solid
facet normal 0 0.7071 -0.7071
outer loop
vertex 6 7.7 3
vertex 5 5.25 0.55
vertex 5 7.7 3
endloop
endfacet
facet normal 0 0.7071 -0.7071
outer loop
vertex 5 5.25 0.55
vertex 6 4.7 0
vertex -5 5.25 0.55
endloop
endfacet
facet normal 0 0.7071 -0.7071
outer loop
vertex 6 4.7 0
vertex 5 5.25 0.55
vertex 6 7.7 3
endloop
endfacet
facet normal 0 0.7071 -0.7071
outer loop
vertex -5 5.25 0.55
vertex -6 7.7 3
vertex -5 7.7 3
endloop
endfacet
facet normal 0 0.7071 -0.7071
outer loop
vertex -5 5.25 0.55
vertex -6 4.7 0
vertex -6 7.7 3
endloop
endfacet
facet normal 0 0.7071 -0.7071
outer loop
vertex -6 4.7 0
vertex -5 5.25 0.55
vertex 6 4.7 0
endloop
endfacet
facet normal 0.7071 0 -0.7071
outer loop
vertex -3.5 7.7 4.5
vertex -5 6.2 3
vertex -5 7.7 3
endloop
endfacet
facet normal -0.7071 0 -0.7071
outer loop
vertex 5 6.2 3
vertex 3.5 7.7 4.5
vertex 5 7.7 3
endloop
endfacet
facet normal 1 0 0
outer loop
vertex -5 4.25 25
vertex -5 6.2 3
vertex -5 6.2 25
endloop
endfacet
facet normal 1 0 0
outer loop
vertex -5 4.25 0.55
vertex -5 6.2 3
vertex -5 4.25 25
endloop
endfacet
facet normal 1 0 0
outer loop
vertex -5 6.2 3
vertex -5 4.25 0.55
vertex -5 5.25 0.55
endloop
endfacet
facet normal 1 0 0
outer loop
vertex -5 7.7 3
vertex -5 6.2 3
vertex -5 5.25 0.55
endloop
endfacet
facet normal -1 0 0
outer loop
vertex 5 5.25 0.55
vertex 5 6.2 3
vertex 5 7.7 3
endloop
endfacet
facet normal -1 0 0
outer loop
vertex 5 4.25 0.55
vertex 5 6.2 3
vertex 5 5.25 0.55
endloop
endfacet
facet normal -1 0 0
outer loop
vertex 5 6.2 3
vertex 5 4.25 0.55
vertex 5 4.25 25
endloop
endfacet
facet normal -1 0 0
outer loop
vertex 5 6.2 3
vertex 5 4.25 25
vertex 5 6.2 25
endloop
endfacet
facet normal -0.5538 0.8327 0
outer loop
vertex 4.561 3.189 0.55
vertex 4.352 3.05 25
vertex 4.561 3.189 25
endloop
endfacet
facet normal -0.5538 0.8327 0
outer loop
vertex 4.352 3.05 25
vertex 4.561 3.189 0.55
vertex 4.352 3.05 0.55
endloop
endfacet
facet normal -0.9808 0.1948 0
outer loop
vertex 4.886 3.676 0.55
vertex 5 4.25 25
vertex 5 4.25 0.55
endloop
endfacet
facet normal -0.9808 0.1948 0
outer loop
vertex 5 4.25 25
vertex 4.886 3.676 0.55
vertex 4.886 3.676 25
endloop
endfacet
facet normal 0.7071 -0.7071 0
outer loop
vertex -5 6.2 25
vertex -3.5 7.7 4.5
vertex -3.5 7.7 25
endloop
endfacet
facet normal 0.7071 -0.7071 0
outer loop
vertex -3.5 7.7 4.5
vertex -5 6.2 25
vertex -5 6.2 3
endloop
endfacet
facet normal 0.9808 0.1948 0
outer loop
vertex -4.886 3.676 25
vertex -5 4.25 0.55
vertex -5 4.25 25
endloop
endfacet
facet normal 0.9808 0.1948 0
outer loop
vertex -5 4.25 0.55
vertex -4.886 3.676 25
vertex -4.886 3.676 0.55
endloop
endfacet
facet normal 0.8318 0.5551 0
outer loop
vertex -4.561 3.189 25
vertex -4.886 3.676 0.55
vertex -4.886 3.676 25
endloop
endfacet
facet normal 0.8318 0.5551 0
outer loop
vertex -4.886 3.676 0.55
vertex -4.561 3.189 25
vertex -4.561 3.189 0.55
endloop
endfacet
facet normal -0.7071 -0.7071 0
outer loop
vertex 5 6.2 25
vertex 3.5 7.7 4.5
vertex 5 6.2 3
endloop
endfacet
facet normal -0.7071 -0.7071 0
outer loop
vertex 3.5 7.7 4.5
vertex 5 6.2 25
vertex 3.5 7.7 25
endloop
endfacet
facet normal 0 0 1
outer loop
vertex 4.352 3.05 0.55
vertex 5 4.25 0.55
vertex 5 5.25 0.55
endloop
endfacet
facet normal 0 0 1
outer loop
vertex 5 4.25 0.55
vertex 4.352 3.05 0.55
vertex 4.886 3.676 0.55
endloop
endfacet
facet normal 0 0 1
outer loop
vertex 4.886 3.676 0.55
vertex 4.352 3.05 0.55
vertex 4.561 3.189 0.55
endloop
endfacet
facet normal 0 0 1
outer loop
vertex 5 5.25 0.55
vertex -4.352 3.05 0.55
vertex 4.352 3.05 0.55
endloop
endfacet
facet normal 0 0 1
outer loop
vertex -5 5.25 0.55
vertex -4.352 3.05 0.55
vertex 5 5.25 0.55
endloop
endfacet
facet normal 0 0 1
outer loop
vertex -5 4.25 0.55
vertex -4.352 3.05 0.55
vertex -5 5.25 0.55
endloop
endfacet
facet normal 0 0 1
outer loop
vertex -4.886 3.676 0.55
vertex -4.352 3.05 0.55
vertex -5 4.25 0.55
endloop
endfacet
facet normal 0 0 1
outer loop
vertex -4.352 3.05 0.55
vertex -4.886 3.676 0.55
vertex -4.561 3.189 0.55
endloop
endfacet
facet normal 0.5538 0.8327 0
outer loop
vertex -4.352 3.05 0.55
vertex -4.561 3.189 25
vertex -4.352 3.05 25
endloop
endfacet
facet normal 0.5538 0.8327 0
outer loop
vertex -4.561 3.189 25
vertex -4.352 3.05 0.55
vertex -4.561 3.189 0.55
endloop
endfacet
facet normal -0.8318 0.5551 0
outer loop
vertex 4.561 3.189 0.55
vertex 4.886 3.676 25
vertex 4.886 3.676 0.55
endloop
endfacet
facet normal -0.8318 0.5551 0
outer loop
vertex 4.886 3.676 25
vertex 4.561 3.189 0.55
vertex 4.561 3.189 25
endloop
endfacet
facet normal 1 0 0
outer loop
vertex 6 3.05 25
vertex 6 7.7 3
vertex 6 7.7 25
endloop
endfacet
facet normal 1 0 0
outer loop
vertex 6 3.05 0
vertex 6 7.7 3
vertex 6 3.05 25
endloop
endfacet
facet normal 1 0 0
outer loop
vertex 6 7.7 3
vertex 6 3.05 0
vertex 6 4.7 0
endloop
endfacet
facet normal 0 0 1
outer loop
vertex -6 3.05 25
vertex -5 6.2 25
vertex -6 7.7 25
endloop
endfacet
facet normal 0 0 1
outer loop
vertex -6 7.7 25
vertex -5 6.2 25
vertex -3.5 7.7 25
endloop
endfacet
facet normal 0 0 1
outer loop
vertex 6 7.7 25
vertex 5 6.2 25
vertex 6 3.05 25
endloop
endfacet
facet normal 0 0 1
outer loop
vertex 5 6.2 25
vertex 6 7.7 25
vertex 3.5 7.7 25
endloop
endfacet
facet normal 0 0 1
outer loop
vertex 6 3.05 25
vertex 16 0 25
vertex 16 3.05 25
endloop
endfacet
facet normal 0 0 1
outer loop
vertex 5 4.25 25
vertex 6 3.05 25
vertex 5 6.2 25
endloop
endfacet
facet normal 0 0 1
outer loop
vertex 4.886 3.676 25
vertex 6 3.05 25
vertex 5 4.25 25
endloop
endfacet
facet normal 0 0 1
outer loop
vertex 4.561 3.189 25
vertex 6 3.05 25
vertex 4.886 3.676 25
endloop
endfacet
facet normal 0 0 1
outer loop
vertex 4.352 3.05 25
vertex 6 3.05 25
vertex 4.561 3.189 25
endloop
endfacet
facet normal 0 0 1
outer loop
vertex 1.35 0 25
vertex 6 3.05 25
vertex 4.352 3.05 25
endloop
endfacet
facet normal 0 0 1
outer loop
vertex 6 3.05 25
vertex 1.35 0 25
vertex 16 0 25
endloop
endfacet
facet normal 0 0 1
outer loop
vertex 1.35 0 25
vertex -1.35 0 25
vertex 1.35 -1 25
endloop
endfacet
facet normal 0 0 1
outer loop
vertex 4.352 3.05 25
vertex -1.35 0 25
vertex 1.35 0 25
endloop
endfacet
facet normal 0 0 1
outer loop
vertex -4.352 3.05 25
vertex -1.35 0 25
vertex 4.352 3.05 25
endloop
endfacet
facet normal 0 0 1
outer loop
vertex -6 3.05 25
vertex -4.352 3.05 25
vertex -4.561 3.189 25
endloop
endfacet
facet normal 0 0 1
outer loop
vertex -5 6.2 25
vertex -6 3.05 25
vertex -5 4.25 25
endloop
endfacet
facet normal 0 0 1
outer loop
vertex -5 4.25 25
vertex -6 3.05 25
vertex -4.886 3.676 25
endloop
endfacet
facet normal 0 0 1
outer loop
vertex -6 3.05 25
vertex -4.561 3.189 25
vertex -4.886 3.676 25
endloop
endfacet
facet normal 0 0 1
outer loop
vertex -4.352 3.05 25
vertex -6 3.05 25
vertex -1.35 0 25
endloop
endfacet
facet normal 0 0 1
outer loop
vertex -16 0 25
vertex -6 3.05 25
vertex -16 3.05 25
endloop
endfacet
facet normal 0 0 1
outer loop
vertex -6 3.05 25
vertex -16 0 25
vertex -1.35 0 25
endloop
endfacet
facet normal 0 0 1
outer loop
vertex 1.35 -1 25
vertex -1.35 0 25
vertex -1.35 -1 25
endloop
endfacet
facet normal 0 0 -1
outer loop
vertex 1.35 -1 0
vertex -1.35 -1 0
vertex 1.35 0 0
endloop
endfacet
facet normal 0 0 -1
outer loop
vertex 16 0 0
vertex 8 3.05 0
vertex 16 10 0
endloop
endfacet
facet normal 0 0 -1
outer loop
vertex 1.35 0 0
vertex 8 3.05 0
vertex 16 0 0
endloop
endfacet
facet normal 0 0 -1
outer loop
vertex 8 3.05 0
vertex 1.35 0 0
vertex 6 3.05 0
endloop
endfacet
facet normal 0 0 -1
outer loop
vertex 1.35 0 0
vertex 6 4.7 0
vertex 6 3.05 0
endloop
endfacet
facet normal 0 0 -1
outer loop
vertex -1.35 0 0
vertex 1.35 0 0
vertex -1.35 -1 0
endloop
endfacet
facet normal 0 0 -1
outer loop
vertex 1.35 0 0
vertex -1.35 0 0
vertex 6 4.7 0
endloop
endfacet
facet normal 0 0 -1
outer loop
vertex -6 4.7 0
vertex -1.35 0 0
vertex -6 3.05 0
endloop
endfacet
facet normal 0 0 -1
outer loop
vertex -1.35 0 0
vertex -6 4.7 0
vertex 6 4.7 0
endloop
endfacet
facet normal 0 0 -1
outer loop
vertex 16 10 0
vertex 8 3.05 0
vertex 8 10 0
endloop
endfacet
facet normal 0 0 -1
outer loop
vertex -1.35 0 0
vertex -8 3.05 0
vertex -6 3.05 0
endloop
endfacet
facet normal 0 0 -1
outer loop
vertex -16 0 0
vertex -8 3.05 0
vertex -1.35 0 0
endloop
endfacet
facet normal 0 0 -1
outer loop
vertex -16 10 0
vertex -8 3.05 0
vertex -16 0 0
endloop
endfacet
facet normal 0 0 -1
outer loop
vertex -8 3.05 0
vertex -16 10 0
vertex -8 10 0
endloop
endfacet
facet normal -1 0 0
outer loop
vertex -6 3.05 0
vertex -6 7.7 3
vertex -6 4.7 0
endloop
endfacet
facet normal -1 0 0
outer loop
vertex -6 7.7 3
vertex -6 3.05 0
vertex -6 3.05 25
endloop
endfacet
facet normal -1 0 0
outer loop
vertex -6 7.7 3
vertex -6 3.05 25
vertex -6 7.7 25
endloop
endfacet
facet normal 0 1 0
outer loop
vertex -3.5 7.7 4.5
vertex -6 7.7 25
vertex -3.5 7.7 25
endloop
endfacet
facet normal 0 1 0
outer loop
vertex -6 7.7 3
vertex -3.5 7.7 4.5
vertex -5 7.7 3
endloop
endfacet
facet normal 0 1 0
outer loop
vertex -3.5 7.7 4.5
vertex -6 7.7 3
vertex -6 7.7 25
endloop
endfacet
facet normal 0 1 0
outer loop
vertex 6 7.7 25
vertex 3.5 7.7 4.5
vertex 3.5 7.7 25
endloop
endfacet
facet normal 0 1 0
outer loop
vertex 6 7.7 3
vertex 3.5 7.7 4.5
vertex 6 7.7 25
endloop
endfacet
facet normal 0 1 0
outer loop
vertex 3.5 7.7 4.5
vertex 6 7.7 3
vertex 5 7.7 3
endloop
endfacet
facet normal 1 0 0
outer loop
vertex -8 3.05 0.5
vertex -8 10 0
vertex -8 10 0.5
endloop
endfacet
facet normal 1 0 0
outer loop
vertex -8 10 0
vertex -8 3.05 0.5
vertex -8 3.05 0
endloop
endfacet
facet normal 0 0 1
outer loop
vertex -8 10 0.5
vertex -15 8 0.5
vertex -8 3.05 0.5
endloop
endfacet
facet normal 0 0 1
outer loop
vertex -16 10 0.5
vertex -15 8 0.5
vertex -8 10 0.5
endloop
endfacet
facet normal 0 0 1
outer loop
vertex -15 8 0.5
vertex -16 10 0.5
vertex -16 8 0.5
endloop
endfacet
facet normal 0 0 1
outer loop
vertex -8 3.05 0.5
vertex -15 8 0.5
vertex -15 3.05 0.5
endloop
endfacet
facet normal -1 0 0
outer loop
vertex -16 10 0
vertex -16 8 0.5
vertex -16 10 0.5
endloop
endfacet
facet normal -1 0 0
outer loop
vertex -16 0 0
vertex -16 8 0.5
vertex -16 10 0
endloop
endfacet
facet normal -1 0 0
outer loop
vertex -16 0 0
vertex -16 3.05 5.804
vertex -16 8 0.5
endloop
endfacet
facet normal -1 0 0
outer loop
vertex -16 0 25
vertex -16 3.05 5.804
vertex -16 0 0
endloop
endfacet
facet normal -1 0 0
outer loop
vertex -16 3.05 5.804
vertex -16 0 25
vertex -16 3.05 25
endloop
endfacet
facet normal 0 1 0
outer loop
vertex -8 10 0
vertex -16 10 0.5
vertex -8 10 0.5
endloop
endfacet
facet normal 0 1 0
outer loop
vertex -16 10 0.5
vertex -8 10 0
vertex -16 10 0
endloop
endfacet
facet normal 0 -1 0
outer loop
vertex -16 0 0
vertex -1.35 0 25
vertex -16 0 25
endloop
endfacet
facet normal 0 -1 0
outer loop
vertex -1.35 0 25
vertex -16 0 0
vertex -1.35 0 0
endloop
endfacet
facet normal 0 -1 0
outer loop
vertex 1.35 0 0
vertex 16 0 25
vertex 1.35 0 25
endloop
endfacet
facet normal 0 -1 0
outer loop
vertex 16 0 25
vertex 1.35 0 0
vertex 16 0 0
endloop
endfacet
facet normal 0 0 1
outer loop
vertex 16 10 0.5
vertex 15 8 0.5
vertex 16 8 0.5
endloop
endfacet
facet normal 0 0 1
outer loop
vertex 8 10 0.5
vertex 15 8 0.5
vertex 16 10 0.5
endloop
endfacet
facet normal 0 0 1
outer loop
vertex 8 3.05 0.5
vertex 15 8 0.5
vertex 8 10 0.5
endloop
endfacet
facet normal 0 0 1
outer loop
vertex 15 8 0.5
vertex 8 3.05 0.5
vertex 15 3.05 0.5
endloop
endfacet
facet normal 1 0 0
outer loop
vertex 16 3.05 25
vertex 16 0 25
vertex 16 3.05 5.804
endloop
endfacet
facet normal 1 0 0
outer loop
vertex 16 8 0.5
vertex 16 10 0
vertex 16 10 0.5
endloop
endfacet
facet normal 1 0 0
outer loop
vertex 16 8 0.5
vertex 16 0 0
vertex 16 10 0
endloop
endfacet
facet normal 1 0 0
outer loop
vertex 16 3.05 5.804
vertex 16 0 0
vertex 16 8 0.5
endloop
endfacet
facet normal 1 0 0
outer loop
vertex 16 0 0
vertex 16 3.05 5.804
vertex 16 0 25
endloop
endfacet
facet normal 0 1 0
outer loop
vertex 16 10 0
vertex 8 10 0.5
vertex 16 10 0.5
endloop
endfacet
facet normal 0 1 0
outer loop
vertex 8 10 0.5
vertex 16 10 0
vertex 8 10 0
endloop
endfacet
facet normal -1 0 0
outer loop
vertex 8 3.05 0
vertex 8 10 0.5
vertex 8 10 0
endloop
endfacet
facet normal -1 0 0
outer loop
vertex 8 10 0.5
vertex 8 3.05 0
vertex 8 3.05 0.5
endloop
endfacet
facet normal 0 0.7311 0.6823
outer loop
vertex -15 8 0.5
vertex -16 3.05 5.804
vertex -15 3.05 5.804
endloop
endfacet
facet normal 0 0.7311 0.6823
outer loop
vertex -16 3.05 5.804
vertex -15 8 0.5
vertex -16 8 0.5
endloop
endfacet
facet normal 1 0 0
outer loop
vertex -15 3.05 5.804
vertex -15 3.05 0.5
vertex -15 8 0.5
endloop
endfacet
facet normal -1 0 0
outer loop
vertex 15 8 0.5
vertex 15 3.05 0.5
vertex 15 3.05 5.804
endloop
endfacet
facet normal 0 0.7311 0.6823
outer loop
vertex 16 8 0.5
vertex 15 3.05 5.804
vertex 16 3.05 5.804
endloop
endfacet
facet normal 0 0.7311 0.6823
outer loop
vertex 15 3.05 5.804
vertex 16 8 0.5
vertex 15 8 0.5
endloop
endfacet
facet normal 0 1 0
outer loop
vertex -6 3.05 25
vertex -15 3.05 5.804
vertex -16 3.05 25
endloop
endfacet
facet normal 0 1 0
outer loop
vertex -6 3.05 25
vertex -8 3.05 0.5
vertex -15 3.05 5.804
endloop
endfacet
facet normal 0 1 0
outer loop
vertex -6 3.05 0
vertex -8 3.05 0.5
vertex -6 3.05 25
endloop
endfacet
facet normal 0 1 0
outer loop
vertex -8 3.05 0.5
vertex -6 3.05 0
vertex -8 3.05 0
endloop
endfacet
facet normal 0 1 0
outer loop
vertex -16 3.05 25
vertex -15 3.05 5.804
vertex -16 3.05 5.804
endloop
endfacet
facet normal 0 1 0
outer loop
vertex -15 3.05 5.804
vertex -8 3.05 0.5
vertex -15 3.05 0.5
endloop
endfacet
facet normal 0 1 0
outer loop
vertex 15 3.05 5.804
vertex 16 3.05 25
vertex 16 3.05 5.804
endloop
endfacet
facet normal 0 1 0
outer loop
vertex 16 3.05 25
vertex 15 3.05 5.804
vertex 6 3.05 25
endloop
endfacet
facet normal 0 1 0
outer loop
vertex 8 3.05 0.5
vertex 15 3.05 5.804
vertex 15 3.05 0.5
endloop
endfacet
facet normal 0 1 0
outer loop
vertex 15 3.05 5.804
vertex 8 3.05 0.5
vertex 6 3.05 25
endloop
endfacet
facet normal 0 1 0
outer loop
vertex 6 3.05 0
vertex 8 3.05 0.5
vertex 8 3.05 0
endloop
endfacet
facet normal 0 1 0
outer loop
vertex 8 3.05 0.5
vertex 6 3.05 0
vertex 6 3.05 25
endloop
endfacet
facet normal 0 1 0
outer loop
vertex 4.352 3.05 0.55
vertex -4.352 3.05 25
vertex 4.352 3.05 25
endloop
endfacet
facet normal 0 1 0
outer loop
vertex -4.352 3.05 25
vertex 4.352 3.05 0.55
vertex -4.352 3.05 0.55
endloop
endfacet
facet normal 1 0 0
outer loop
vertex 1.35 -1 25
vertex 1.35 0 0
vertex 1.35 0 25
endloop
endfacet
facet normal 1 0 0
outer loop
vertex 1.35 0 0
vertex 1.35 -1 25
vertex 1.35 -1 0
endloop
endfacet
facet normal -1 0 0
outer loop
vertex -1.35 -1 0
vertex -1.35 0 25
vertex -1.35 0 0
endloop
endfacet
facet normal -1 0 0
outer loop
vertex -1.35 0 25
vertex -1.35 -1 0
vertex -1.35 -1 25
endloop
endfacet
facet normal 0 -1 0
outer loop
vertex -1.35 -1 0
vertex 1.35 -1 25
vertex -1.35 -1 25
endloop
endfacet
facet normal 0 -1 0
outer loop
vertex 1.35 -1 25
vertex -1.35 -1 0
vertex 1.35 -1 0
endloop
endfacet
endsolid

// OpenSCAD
// file: ../parameters.scad
/*
  Useful settings/parameters for the OpenFlexure fibre stage
*/
version_numstring = "0.2.0";
stage = [37,20,5]; //dimensions of stage part

// Range of travel is lever length * flex_a
xy_lever = 10;
z_lever = 10;

// Mechanical reduction settings
xy_stage_reduction = 3; //ratio of sample motion to lower shelf motion
xy_reduction = 5; //mechanical reduction from screw to sample
z_reduction = 5; //mechanical reduction for Z

// Motor lugs
motor_lugs = true;

// Flexure dimensions - good for PLA and ~0.5mm nozzle
zflex = [6, 1.5, 0.75]; //dimensions of flexure
xflex = [5,5.5,5]; //default bounding box of x flexure
xflex_t = 1; //thickness of bendy bit in x
flex_a = 0.1; //angle through which flexures are bent, radians
dz = 0.5; //thickness before a bridge is printable-on

xy_travel = xy_lever * flex_a; //max. travel in X or Y
xy_bottom_travel = xy_travel * xy_stage_reduction; //travel of bottom of XY stage
xy_actuator_pivot_w = 25; //width of the hinge for the actuating lever
actuator_h = 26; //height of actuator columns (~screw length)

pushstick = [5,38,5]; //cross-section of XY "push stick"
pw = pushstick[0]; //because this is used in a lot of places...

wall_t = 1.6;
d=0.05;

// Height of the bridging "shelves" in the XY axis "table" structure
shelf_z1 = xy_lever * xy_stage_reduction;
shelf_z2 = shelf_z1 + xy_lever;

// Z axis geometry
z_travel = z_lever * flex_a; //max. travel in Z
z_stage_base_y = -stage[1]/2-xy_bottom_travel; //position of the flexure edge of the Z stage
z_stage_base_w = stage[0] + 2*zflex[1] - 2*xy_bottom_travel - 2; //width of the flexure edge of the Z stage
z_anchor_bottom_y = z_stage_base_y - z_lever - zflex[1]; // lower Z stage end of the fixed base
z_actuator_pivot_y = stage[1]/2 + zflex[1] + zflex[0] + xy_bottom_travel + wall_t;
z_actuator_pivot_w = 20; //width of the hinge for the Z actuator lever
z_pushstick_z = shelf_z1 - pw - 2.5; // height of the Z pushstick

// Mounting stuff
mounting_bolts = [[-1,0,0],[0,-1,0],[1,0,0]]*25*1*1.41; //bolt to the bench
platform_z = shelf_z2 + stage[2] + 7;
fixed_platform_standoff = 10;
fixed_platform = [50,40,4];
platform_gap = xy_travel + 1;
casing_top = shelf_z2 + stage[2] - z_travel; //top of the wall
// main file
/*

An adapter to fit the OpenFlexure Microscope optics module on the
fibre alignment stage

(c) 2016 Richard Bowman - released under CERN Open Hardware License

*/

use <utilities.scad>;
use <dovetail.scad>;
include <../parameters.scad>;

//beam_height = platform_z + 3 + 10 + 6; //for picamera lens optics
beam_height_from_platform = 12.7;
beam_height = platform_z + 12.7; //for compatibility with standard stuff
objective_clip_w = 10;
objective_clip_y = 6;
clip_outer_w = objective_clip_w + 4;

module optics_to_platform(){
    h=25;
    clip_l = 5;
    keel = [3-0.3,1,h];
    translate([0,beam_height_from_platform-clip_l,0]) mirror([0,1,0]) dovetail_clip([10+2*1,clip_l,h],solid_bottom=0.5,slope_front=3,t=1);
    translate([-16,0,0]) cube([32,3+d,h]);
    translate([-keel[0]/2,-keel[1],0]) cube(keel+[0,d,0]);
    //supports for during the print (snap off later)
    reflect([1,0,0]) translate([-16,0,0]) cube([8,10,0.5]);
    reflect([1,0,0]) translate([-16,0,0]) hull(){
       cube([1,8,0.5]);
       cube([1,1,8]);
    }
}

module disc_to_platform(){
    h=12;
    id=25.4;
    bh=12.7;//beam height
    ot=4;//optic thickness
    keel = [3-0.3,1,h];
    difference(){
        union(){
            translate([-16,0,0]) cube([32,3+d,h]);
            translate([-keel[0]/2,-keel[1],0]) cube(keel+[0,d,0]);
            difference(){
                hull(){
                    translate([0,bh,0]) cylinder(d=id+3,h=h,$fn=64);
                    translate([-5,bh+id/2,0]) cube([10,10,h]);
                }
                //ground
                translate([0,-999,0]) cube(999*2, center=true);
                
            }
        }
        
        //optic
        difference(){
            translate([0,bh,1]) cylinder(d=id, h=999, $fn=64);
            translate([-999,bh-id/2,1+ot]) rotate([75,0,0]) cube(999*2);
        }
        translate([0,bh,-1]) cylinder(d=id-2, h=ot+1, $fn=64);
        
        //bolt
        translate([0,bh+id/2+5,h/2]) rotate(90) pinch_y(4,t=2, nut_l=999,screw_l=10,extra_height=0,gap=[30,4,999]);
    }
}
//disc_to_platform();

module slide_holder(){
    h = beam_height - shelf_z2 - stage[2] + 5;
    w = 20;
    so = fixed_platform_standoff;
    difference(){
        union(){
            translate([-w/2,-so+2,0]) cube([w,4,h]);
            translate([-w/2,-so+2,0]) cube([w,so-2 + 2 + 4,4]);
        }
        reflect([1,0,0]) hull() reflect([0,1,0]) translate([5*sqrt(2),2,1]) cylinder(d=3.5,h=20,$fn=16, center=true);
        reflect([1,0,0]) hull() reflect([0,1,0]) translate([5*sqrt(2),2,1]) cylinder(r=3.2,h=10,$fn=16);
        translate([0,0,beam_height - shelf_z2 - stage[2]]) rotate([90,0,0]) cylinder(d=3.2,h=999,center=true,$fn=16);
    }
}
//slide_holder();

module inch_disc_holder(){
    h = beam_height - shelf_z2 - stage[2] + 5;
    w = 20;
    so = fixed_platform_standoff;
    id=25.4;
    difference(){
        union(){
            translate([0,-so+2,beam_height - shelf_z2 - stage[2]]) hull(){
                rotate([-90,0,0]) cylinder(d=id+3,h=4,$fn=32);
            }
            translate([-w/2,-so+2,0]) cube([w,4,h]);
            translate([-w/2,-so+2,0]) cube([w,so-2 + 2 + 4,4]);
        }
        reflect([1,0,0]) hull() reflect([0,1,0]) translate([5*sqrt(2),2,1]) cylinder(d=3.5,h=20,$fn=16, center=true);
        translate([0,-so+3,beam_height - shelf_z2 - stage[2]]) rotate([-90,0,0]) cylinder(d=id,h=999,$fn=64);
        translate([0,-so+3,beam_height - shelf_z2 - stage[2]]) rotate([-90,0,0]) cylinder(d=id-2,h=999,center=true,$fn=64);
    }
}
//inch_disc_holder();
//difference(){
//    cylinder(d=23,h=8);
//    cylinder(d=10,h=999,center=true);
//}
optics_to_platform();
